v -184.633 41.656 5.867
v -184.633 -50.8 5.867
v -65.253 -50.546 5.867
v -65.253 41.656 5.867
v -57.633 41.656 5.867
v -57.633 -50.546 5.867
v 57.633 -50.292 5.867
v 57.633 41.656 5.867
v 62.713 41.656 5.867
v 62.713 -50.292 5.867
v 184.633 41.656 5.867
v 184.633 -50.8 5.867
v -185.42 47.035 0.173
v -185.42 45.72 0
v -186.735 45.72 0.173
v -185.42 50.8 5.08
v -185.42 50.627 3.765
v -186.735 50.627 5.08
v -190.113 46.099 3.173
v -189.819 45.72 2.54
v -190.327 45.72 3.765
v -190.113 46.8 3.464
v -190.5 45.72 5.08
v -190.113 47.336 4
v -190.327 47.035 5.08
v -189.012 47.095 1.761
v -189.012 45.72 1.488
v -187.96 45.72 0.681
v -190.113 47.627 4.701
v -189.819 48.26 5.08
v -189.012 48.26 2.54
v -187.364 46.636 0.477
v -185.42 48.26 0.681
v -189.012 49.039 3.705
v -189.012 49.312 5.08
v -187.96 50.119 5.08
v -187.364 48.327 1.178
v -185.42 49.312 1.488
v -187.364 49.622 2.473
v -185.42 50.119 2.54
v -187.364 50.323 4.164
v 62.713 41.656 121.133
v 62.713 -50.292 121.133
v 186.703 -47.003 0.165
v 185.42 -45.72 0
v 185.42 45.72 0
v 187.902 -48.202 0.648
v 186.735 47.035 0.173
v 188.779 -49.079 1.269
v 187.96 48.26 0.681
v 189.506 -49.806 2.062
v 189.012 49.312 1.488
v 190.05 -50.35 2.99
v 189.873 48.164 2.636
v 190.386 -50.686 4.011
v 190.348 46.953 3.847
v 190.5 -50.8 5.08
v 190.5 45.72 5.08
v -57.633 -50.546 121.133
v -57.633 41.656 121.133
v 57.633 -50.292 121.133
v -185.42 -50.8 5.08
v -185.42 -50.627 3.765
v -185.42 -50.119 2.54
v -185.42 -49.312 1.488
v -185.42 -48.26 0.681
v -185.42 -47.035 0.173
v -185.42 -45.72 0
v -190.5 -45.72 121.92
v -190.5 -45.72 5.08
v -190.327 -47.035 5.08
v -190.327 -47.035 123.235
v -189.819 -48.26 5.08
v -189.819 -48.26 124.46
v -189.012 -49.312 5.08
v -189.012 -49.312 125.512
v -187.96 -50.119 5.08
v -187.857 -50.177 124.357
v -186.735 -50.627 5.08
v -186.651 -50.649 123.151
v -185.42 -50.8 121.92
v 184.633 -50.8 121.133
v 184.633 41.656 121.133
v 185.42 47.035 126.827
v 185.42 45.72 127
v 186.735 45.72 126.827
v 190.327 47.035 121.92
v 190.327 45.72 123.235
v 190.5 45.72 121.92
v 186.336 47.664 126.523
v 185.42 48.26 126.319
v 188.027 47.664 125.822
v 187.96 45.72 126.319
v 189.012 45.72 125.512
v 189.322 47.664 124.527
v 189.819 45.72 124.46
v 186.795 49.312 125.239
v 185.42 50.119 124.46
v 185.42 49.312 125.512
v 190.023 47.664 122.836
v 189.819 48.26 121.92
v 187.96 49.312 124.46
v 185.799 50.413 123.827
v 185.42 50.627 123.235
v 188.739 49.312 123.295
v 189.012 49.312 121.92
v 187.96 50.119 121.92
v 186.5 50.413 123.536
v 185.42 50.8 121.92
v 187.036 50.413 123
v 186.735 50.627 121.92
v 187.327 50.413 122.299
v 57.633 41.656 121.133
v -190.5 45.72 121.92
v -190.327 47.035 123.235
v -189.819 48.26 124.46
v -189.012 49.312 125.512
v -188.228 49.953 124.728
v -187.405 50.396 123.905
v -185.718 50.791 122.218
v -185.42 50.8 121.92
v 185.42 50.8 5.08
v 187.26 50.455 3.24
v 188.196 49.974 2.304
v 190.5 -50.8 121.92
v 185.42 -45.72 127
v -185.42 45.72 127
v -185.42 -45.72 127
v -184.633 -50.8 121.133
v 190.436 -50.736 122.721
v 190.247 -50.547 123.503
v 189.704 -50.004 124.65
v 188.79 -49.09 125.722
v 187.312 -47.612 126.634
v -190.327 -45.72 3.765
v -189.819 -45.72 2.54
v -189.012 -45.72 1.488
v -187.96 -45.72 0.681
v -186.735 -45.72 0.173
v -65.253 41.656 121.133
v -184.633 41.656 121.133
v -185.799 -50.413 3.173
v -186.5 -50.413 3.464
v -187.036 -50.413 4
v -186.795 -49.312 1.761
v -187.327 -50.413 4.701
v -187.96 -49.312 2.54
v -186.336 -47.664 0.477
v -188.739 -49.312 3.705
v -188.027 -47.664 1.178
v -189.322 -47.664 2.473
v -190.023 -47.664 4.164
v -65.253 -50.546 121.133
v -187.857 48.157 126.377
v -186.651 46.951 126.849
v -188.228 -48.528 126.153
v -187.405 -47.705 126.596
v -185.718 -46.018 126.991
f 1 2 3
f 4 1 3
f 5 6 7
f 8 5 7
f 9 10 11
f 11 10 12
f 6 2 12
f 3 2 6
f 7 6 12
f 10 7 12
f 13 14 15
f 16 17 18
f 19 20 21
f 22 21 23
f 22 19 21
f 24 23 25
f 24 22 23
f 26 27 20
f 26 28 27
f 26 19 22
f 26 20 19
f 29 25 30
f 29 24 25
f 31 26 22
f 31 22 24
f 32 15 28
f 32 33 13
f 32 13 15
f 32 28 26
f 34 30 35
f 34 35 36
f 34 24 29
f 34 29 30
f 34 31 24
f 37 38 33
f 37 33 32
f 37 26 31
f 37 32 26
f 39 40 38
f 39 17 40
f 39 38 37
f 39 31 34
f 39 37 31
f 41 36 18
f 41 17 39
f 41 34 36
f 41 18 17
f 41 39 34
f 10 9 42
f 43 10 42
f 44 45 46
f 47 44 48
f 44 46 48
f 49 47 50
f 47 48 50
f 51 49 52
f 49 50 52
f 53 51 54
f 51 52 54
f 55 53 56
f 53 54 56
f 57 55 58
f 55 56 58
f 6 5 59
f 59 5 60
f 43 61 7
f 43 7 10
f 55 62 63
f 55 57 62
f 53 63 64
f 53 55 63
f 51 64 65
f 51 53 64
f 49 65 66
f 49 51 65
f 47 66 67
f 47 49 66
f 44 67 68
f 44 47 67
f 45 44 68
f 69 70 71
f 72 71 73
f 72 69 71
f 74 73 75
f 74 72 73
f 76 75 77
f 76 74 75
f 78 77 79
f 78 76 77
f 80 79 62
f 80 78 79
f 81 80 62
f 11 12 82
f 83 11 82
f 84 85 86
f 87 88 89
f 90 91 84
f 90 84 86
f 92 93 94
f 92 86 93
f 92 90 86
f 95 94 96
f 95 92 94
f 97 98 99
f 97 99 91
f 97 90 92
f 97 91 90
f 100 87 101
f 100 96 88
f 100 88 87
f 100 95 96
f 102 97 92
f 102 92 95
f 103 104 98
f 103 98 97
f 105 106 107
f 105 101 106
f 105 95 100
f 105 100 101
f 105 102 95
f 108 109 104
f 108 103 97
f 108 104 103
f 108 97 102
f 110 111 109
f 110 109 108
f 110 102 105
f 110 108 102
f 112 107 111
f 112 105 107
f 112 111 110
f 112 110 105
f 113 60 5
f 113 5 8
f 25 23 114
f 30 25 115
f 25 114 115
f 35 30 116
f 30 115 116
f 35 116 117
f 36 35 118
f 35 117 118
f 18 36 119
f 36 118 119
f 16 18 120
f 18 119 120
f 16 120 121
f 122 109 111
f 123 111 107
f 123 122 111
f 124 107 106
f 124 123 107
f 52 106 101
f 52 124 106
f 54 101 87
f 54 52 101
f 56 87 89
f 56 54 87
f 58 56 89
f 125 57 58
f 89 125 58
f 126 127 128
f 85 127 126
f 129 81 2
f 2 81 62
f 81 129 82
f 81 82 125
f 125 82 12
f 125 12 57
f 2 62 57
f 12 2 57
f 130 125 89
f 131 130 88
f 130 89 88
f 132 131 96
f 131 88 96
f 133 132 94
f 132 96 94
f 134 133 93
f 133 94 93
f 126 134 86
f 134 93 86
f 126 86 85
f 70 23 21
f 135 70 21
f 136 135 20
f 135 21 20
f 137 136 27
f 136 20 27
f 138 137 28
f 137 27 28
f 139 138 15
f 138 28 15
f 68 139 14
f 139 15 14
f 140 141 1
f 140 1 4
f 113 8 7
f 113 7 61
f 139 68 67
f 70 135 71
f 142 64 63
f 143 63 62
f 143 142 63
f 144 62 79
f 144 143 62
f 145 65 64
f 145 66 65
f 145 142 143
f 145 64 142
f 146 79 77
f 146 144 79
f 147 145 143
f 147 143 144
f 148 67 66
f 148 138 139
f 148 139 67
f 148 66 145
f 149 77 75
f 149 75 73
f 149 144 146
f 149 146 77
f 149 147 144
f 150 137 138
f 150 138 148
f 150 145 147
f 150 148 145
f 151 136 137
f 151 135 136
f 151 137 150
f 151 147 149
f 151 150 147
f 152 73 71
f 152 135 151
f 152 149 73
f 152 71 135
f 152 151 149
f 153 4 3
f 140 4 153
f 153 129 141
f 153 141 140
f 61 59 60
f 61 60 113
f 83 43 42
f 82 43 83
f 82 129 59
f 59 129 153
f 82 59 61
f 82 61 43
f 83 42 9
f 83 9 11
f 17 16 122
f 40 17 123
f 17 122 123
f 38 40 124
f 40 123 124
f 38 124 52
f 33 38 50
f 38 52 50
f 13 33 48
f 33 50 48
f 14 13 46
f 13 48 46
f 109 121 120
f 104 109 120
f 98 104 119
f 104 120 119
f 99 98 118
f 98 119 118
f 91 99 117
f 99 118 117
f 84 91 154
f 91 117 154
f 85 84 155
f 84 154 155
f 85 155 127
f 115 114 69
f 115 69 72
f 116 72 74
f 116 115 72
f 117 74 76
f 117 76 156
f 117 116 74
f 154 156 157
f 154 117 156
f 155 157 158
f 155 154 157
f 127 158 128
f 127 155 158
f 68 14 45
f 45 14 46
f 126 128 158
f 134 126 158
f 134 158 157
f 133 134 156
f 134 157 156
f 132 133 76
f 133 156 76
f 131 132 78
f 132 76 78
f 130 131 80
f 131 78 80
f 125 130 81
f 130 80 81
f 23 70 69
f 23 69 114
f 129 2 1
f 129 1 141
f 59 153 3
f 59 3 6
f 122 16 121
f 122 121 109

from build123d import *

# Parameters (mm, degrees)
F0_W         = 381
F0_H         = 101.6
F1_DEPTH     = 127
F2_W         = 369.2652
F2_H         = 115.2652
F3_DEPTH     = 92.456
F4_W         = 7.62
F4_H         = 115.2652
F5_DEPTH     = 92.202
F6_W         = 5.08
F6_H         = 115.2652
F7_DEPTH     = 91.948
F8_R         = 5.08
F9_T1_DEPTH  = 383.54
F9_T3_DEPTH  = 109.22
F9_T5_DEPTH  = 401.32
F9_T7_DEPTH  = 129.54
F9_S11_W     = 5.1816
F9_S11_H     = 5.1816
F9_T12_DEPTH = 5.1816


# Not quite as in the source:
# - a fillet or chamfer that OpenCascade refuses, or shapes differently, is made with other operations: its cross-section is extruded or revolved along the edge and cut away or added


with BuildPart() as f1:
    # F0 (on Top) → F1 (new body)
    with BuildSketch(Plane.XY):
        Rectangle(F0_W, F0_H)
    extrude(amount=F1_DEPTH)

    # F2 (on face) → F3 (cut)
    with BuildSketch(Plane.XZ.offset(50.8)):
        with Locations((0, 63.5)):
            Rectangle(F2_W, F2_H)
    extrude(amount=-F3_DEPTH, mode=Mode.SUBTRACT)

    # F4 (on face) → F5 (join)
    with BuildSketch(Plane.XZ.offset(-41.656)):
        with Locations((-61.4426, 63.5)):
            Rectangle(F4_W, F4_H)
    extrude(amount=F5_DEPTH)

    # F6 (on face) → F7 (join)
    with BuildSketch(Plane.XZ.offset(-41.656)):
        with Locations((60.1726, 63.5)):
            Rectangle(F6_W, F6_H)
    extrude(amount=F7_DEPTH)

    # F8
    f8_edges = [f1.edges().sort_by_distance(p)[0] for p in [
        (0, 50.8, 0),
        (-190.5, 0, 0),
        (0, -50.8, 0),
        (190.5, 0, 0),
        (-190.5, 50.8, 63.5),
        (-190.5, -50.8, 63.5),
        (-190.5, 0, 127),
    ]]
    fillet(f8_edges, radius=F8_R)

    # F9: fillet of radius 5.08 on 7 edges, made by hand

    # F9_s2 → F9_t1 (cut)
    with BuildSketch(Plane.YZ.offset(-198.12)):
        with BuildLine():
            ThreePointArc((50.8, 121.92), (49.3121024484, 125.5121024484), (45.72, 127))
            Line((45.72, 127), (50.8, 127))
            Line((50.8, 127), (50.8, 121.92))
        make_face()
    extrude(amount=F9_T1_DEPTH, mode=Mode.SUBTRACT)

    # F9_s4 → F9_t3 (cut)
    with BuildSketch(Plane.XZ.offset(-45.72)):
        with BuildLine():
            ThreePointArc((190.5, 121.92), (189.0121024484, 125.5121024484), (185.42, 127))
            Line((185.42, 127), (190.5, 127))
            Line((190.5, 127), (190.5, 121.92))
        make_face()
    extrude(amount=F9_T3_DEPTH, mode=Mode.SUBTRACT)

    # F9_s6 → F9_t5 (cut)
    with BuildSketch(Plane.YZ.offset(-198.12)):
        with BuildLine():
            ThreePointArc((-45.72, 127), (-49.3121024484, 125.5121024484), (-50.8, 121.92))
            Line((-50.8, 121.92), (-50.8, 127))
            Line((-50.8, 127), (-45.72, 127))
        make_face()
    extrude(amount=F9_T5_DEPTH, mode=Mode.SUBTRACT)

    # F9_s8 → F9_t7 (cut)
    with BuildSketch(Plane.XY.offset(-7.62)):
        with BuildLine():
            ThreePointArc((185.42, 50.8), (189.0121024484, 49.3121024484), (190.5, 45.72))
            Line((190.5, 45.72), (190.5, 50.8))
            Line((190.5, 50.8), (185.42, 50.8))
        make_face()
    extrude(amount=F9_T7_DEPTH, mode=Mode.SUBTRACT)


with BuildPart() as f9_tool10:
    # F9_s11 → F9_t12 (new body)
    with BuildSketch(Plane.XZ.offset(-45.72)):
        with Locations((188.0108, 124.5108)):
            Rectangle(F9_S11_W, F9_S11_H)
    extrude(amount=-F9_T12_DEPTH)

    # F9_s13 → F9_t14 (revolve, cut)
    with BuildSketch(Plane(origin=(185.42, 45.72, 121.92), x_dir=(-0.7071067812, 0, -0.7071067812), z_dir=(0.7071067812, 0, -0.7071067812))):
        with BuildLine():
            ThreePointArc((0, -5.08), (5.08, 0), (0, 5.08))
            Line((0, 5.08), (0, -5.08))
        make_face()
    revolve(axis=Axis((185.42, 45.72, 121.92), (0, 1, 0)), mode=Mode.SUBTRACT)


with BuildPart() as f1_1:
    add(f1.part)

    # F9_t9: cut F9_tool10
    add(f9_tool10.part, mode=Mode.SUBTRACT)


solid = f1_1.part
